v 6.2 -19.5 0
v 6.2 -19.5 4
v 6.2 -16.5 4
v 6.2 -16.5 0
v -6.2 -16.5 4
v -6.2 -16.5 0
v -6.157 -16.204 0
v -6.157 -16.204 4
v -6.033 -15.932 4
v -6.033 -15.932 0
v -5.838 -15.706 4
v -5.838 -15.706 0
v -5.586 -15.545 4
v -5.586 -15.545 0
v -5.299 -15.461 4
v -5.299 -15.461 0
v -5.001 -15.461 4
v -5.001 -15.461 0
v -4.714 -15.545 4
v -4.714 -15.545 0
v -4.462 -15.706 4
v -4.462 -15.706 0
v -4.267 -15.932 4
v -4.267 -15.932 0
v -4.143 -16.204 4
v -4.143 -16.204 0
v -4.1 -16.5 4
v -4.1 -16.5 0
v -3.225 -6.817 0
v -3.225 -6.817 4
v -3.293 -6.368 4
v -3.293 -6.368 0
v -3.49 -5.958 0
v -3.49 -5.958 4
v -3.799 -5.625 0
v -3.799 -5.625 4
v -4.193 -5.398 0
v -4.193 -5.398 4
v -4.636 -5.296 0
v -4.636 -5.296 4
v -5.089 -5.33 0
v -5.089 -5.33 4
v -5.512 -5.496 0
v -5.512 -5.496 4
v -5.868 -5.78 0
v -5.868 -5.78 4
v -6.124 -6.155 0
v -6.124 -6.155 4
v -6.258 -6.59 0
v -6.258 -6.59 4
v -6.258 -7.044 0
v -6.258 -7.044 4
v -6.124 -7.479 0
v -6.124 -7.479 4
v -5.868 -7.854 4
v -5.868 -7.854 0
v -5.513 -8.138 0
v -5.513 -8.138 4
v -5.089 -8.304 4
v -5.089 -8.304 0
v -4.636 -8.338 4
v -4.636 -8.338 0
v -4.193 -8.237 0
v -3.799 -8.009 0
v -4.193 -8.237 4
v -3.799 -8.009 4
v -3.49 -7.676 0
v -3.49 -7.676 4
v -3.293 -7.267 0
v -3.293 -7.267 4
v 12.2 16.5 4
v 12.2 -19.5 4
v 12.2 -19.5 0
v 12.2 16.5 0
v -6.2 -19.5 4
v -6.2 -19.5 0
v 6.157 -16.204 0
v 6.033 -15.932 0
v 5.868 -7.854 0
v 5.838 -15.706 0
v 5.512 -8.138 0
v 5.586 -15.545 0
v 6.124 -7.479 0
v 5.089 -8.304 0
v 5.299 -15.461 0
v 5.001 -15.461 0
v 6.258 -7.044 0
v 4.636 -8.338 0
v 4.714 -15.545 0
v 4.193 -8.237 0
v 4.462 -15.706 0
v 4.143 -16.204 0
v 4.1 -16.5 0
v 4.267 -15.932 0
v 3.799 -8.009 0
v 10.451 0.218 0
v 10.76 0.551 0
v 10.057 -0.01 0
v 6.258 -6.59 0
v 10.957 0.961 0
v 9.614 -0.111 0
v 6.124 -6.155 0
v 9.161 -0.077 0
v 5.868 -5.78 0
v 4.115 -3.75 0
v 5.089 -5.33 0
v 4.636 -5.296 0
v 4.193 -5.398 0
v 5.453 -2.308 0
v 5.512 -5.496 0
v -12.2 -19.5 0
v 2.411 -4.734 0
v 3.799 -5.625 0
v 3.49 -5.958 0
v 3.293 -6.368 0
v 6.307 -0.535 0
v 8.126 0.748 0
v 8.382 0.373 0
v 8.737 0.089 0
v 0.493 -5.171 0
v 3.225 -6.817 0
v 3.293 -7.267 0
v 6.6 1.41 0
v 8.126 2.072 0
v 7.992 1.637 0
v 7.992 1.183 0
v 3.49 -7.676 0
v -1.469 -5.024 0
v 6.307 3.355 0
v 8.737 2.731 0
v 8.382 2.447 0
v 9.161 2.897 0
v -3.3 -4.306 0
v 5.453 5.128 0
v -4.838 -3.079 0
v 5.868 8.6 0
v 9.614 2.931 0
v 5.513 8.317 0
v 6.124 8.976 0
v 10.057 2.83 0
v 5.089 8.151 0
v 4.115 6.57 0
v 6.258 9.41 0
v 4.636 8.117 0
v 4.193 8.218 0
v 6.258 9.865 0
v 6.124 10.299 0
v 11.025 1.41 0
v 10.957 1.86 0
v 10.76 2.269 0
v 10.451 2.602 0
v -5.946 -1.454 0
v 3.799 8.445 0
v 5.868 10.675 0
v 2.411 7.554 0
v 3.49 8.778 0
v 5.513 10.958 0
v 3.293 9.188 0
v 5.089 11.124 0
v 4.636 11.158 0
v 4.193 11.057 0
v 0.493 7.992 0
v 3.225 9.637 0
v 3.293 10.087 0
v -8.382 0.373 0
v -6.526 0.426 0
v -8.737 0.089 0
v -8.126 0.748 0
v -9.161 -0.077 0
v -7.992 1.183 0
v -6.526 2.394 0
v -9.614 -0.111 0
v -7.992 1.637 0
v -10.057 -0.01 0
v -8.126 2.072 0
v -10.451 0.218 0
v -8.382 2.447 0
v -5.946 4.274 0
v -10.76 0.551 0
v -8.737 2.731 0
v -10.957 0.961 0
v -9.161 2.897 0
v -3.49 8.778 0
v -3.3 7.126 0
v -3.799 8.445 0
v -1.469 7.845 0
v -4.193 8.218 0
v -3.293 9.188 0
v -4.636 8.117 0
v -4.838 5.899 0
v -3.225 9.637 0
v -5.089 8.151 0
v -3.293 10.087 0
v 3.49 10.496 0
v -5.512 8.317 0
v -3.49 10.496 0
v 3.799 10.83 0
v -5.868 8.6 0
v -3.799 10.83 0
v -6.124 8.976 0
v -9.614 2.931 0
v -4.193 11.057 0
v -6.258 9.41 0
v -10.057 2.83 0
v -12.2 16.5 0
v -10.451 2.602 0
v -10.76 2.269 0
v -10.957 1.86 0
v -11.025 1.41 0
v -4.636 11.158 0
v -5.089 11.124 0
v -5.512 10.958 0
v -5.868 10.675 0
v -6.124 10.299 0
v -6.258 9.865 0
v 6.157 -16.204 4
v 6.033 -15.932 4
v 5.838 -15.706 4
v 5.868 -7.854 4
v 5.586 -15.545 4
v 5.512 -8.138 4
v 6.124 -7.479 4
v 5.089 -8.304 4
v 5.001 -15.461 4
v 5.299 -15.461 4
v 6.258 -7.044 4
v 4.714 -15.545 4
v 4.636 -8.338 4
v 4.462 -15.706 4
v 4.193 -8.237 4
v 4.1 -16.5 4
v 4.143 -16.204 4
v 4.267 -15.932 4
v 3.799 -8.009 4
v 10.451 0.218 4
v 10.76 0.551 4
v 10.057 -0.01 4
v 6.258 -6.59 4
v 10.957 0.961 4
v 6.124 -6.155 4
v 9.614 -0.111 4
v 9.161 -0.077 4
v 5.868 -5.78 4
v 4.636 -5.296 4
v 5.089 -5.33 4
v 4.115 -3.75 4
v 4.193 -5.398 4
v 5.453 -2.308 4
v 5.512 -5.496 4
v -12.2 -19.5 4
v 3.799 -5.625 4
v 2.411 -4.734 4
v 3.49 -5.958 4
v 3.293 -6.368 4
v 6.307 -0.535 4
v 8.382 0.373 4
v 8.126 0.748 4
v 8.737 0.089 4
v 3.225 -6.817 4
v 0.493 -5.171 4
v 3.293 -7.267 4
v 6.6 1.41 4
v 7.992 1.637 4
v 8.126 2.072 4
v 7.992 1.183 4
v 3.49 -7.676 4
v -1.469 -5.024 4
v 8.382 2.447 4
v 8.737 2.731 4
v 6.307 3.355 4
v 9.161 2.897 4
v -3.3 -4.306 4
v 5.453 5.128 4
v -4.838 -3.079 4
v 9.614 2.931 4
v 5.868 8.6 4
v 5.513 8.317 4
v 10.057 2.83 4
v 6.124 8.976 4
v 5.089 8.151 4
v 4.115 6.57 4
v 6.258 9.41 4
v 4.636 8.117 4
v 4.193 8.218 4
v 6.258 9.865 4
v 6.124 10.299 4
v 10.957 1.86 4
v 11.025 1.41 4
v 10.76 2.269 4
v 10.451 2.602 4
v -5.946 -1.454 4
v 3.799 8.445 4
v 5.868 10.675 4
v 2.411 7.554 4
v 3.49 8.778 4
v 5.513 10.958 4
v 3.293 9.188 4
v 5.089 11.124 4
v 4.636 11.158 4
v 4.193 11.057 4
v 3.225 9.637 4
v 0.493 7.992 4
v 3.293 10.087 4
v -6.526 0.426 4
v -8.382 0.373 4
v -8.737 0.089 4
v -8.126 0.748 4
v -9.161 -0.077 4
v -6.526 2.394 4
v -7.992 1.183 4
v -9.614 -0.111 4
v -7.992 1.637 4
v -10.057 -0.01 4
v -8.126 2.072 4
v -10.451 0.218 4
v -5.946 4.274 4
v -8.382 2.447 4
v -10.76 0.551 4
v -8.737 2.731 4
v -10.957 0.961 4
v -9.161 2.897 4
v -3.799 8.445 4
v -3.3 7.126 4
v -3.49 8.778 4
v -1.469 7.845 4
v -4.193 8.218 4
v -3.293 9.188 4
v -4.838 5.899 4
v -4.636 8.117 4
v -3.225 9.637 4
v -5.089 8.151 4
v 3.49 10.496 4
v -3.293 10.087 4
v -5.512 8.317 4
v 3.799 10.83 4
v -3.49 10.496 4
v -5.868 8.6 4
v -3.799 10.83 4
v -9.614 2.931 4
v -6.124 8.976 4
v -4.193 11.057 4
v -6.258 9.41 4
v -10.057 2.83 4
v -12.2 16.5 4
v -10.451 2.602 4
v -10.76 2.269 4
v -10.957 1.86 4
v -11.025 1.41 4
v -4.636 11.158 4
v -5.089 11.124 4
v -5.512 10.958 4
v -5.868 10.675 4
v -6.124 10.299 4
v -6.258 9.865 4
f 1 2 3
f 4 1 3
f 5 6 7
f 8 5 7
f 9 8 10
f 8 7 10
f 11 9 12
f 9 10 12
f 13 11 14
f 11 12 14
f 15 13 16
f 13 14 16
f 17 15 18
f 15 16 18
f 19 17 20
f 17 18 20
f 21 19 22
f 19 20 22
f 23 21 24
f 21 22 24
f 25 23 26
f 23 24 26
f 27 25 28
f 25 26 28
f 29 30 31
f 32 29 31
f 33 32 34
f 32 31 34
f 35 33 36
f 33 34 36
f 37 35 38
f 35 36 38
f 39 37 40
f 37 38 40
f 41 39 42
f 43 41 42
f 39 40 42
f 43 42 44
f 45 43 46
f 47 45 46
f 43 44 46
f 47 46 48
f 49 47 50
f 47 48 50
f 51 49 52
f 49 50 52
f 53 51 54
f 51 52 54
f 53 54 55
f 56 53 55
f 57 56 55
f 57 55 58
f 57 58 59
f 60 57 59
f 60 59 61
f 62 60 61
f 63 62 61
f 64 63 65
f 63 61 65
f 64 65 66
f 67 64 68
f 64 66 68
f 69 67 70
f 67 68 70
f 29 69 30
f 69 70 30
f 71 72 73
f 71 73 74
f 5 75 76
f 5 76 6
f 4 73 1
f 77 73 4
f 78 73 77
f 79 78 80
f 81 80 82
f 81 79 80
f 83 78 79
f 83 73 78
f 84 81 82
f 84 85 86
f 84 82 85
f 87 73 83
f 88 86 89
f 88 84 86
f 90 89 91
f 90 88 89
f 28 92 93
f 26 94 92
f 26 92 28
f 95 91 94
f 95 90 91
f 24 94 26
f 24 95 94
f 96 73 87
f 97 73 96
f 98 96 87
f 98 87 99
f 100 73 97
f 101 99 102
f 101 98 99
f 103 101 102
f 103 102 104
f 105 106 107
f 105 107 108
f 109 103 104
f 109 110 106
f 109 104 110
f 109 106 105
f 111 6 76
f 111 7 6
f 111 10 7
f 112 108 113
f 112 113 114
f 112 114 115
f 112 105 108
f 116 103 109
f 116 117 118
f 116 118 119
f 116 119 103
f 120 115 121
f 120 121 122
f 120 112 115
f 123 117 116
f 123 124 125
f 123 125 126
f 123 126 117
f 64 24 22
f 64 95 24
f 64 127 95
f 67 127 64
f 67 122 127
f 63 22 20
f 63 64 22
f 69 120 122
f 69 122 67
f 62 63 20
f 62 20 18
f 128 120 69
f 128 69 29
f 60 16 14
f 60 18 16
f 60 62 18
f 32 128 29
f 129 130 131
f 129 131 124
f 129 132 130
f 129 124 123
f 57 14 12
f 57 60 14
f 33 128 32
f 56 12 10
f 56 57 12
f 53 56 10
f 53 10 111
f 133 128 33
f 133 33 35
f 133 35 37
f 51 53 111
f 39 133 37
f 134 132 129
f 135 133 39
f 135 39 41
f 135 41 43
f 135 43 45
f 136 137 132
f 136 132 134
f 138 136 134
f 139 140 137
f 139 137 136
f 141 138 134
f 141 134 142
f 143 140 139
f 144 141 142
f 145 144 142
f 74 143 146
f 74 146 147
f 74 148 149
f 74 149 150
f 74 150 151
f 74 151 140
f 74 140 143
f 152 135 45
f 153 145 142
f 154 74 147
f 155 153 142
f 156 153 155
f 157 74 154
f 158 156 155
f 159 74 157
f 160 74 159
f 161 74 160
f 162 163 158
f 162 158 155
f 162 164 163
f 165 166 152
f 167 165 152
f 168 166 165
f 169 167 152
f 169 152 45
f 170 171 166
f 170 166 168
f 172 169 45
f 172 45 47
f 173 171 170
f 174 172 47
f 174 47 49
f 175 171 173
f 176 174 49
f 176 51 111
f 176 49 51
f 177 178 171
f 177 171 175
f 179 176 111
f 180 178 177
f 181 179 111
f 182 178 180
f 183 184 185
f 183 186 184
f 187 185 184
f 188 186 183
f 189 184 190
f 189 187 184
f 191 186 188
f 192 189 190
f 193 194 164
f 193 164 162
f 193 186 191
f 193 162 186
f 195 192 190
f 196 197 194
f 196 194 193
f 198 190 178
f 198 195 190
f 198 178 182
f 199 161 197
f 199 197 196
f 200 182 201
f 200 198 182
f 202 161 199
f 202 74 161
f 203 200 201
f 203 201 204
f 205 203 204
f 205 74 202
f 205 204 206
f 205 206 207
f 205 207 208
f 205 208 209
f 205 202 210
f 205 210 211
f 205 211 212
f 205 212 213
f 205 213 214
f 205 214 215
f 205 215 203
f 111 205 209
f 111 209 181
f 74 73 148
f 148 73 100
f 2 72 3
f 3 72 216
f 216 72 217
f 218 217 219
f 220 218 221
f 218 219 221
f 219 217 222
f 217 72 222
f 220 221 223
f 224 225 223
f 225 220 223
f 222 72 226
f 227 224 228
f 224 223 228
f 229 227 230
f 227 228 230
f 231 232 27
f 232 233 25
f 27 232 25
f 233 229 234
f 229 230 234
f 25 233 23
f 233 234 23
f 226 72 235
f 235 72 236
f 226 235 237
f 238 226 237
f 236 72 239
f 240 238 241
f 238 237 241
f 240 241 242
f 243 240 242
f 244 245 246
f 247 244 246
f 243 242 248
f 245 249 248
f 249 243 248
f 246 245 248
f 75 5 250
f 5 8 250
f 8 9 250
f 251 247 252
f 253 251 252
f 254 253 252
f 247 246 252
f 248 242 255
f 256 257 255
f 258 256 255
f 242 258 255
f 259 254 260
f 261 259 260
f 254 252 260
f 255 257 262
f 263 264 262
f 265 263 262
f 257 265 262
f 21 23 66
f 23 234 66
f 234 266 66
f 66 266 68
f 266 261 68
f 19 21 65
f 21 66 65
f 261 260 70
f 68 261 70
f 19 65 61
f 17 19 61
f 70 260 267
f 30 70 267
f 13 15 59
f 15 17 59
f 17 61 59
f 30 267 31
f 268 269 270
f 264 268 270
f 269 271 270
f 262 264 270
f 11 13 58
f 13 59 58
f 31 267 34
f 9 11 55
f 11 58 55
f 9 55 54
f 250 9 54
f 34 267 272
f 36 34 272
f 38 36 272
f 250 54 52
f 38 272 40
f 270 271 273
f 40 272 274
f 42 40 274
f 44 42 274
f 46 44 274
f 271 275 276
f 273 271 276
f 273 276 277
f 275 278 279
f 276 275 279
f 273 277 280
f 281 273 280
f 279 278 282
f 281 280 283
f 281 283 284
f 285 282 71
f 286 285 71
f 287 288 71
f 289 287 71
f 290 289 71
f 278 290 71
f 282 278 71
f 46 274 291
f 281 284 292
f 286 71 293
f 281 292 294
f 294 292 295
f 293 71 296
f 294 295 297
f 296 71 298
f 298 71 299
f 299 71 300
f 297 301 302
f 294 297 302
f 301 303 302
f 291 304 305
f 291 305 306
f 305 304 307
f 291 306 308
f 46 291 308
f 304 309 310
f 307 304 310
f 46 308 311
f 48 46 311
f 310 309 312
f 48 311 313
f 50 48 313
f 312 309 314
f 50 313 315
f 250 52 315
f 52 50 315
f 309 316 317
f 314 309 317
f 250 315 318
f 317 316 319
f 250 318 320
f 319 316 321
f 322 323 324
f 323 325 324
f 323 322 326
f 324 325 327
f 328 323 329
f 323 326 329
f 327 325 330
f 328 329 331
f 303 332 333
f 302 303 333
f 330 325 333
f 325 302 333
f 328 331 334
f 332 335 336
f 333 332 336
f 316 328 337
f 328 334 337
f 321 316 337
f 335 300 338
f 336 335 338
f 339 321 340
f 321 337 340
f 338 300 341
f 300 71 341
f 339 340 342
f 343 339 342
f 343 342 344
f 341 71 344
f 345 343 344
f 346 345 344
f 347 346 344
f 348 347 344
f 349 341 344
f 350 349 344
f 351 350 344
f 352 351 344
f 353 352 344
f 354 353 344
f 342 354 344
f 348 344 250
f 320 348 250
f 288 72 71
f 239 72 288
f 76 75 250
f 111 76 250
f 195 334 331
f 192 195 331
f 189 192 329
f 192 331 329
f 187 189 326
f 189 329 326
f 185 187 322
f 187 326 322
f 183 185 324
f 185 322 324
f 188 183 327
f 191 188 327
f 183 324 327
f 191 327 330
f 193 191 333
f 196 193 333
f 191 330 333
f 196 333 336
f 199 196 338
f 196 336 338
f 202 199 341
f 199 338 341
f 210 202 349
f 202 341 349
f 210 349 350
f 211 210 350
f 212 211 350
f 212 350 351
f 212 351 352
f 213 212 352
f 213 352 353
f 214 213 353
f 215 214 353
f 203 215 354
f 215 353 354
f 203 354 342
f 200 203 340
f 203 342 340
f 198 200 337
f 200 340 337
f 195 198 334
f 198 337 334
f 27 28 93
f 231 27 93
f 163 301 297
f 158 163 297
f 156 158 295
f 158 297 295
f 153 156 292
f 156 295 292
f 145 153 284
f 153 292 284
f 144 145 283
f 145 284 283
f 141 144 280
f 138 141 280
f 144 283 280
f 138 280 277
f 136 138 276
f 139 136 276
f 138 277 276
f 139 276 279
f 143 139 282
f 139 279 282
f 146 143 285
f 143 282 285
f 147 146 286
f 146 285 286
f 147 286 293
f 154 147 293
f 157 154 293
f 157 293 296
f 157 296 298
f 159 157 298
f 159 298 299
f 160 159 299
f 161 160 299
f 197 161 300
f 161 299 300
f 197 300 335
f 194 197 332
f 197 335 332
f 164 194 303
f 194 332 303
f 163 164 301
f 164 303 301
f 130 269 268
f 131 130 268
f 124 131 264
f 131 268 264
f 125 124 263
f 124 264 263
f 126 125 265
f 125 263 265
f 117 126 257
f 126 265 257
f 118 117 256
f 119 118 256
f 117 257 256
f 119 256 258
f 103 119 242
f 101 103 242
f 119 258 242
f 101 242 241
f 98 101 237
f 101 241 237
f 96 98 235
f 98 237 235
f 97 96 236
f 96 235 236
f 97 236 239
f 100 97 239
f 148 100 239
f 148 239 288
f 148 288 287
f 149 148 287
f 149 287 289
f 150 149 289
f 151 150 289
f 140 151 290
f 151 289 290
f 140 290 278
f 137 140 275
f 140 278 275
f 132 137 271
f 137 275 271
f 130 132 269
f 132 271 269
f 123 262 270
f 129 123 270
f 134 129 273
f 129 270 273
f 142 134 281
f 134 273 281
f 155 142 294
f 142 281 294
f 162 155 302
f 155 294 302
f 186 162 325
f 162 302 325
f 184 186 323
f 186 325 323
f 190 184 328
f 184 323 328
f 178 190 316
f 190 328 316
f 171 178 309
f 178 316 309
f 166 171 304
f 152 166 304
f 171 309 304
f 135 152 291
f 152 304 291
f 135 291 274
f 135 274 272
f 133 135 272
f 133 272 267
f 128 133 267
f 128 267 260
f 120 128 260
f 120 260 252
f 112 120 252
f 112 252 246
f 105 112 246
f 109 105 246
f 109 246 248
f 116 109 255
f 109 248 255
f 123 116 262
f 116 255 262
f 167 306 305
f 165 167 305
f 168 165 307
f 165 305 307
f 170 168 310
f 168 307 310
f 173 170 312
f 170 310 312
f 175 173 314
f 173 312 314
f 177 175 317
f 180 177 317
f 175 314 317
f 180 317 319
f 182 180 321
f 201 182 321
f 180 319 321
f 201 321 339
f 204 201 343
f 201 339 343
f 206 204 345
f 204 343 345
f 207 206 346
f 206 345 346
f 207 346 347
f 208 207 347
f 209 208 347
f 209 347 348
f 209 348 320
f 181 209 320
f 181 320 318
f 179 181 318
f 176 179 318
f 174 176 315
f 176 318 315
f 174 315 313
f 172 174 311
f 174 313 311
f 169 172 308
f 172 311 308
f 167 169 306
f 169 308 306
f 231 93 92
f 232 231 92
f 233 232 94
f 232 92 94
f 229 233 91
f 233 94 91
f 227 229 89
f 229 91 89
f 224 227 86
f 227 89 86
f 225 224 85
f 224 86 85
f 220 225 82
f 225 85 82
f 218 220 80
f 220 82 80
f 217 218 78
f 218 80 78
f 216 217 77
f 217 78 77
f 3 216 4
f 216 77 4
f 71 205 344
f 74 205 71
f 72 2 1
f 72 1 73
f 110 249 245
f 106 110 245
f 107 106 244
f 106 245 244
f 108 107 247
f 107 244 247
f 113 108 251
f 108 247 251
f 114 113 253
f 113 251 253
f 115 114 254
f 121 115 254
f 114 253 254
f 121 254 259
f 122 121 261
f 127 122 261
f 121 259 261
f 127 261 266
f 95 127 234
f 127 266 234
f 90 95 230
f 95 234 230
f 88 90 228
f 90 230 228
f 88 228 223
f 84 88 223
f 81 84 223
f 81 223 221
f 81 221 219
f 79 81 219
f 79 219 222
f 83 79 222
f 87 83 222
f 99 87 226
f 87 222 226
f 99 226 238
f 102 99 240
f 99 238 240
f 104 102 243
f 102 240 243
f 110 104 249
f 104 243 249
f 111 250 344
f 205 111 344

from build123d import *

# Parameters (mm, degrees)
SKETCH_2_W               = 24.4
SKETCH_2_H               = 33
EXTRUDE_1_DEPTH          = 4
SKETCH_3_R               = 6.6
CUT_EXTRUDE_1_DEPTH      = 4
SKETCH_4_W               = 6
SKETCH_4_H               = 3
EXTRUDE_2_DEPTH          = 4
SKETCH_5_R               = 1.05
CUT_EXTRUDE_2_DEPTH      = 4
SKETCH_6_R               = 1.525
CUT_EXTRUDE_3_DEPTH      = 4
PATTERN_CIRCULAR_1_COUNT = 6


with BuildPart() as part:
    # 草图2 → 凸台-拉伸1 (new body)
    with BuildSketch(Plane.XY):
        Rectangle(SKETCH_2_W, SKETCH_2_H)
    extrude(amount=EXTRUDE_1_DEPTH)

    # 草图3 → 切除-拉伸1 (cut)
    with BuildSketch(Plane.XY.offset(4)):
        with Locations((0, 1.410077419)):
            Circle(SKETCH_3_R)
    extrude(amount=-CUT_EXTRUDE_1_DEPTH, mode=Mode.SUBTRACT)

    # 草图4 → 凸台-拉伸2 (add)
    with BuildSketch(Plane.XY.offset(4)):
        with Locations((9.2, -18)):
            Rectangle(SKETCH_4_W, SKETCH_4_H)
    extrude_2 = extrude(amount=-EXTRUDE_2_DEPTH)

    # 镜向1: 凸台-拉伸2 across plane
    add(extrude_2.mirror(Plane(origin=(0, 0, 0), x_dir=(0, 0, 1), z_dir=(1, 0, 0))))

    # 草图5 → 切除-拉伸2 (cut)
    with BuildSketch(Plane(origin=(0, 0, 0), x_dir=(-1, 0, 0), z_dir=(0, 0, -1))):
        with Locations((-5.15, -16.5)):
            Circle(SKETCH_5_R)
        with Locations((5.15, -16.5)):
            Circle(SKETCH_5_R)
    extrude(amount=-CUT_EXTRUDE_2_DEPTH, mode=Mode.SUBTRACT)

    # 草图6 → 切除-拉伸3 (cut)
    with BuildSketch(Plane.XY.offset(4)):
        with Locations((-4.75, -6.817163916)):
            Circle(SKETCH_6_R)
    cut_extrude_3 = extrude(amount=-CUT_EXTRUDE_3_DEPTH, mode=Mode.SUBTRACT)

    # 阵列(圆周)1: 切除-拉伸3 ×6 about axis
    pattern_circular_1_axis = Axis((0, 1.410077419, 0), (0, 0, 1))
    for i in range(1, PATTERN_CIRCULAR_1_COUNT):
        add(cut_extrude_3.rotate(pattern_circular_1_axis, i * 360 / PATTERN_CIRCULAR_1_COUNT), mode=Mode.SUBTRACT)


solid = part.part
